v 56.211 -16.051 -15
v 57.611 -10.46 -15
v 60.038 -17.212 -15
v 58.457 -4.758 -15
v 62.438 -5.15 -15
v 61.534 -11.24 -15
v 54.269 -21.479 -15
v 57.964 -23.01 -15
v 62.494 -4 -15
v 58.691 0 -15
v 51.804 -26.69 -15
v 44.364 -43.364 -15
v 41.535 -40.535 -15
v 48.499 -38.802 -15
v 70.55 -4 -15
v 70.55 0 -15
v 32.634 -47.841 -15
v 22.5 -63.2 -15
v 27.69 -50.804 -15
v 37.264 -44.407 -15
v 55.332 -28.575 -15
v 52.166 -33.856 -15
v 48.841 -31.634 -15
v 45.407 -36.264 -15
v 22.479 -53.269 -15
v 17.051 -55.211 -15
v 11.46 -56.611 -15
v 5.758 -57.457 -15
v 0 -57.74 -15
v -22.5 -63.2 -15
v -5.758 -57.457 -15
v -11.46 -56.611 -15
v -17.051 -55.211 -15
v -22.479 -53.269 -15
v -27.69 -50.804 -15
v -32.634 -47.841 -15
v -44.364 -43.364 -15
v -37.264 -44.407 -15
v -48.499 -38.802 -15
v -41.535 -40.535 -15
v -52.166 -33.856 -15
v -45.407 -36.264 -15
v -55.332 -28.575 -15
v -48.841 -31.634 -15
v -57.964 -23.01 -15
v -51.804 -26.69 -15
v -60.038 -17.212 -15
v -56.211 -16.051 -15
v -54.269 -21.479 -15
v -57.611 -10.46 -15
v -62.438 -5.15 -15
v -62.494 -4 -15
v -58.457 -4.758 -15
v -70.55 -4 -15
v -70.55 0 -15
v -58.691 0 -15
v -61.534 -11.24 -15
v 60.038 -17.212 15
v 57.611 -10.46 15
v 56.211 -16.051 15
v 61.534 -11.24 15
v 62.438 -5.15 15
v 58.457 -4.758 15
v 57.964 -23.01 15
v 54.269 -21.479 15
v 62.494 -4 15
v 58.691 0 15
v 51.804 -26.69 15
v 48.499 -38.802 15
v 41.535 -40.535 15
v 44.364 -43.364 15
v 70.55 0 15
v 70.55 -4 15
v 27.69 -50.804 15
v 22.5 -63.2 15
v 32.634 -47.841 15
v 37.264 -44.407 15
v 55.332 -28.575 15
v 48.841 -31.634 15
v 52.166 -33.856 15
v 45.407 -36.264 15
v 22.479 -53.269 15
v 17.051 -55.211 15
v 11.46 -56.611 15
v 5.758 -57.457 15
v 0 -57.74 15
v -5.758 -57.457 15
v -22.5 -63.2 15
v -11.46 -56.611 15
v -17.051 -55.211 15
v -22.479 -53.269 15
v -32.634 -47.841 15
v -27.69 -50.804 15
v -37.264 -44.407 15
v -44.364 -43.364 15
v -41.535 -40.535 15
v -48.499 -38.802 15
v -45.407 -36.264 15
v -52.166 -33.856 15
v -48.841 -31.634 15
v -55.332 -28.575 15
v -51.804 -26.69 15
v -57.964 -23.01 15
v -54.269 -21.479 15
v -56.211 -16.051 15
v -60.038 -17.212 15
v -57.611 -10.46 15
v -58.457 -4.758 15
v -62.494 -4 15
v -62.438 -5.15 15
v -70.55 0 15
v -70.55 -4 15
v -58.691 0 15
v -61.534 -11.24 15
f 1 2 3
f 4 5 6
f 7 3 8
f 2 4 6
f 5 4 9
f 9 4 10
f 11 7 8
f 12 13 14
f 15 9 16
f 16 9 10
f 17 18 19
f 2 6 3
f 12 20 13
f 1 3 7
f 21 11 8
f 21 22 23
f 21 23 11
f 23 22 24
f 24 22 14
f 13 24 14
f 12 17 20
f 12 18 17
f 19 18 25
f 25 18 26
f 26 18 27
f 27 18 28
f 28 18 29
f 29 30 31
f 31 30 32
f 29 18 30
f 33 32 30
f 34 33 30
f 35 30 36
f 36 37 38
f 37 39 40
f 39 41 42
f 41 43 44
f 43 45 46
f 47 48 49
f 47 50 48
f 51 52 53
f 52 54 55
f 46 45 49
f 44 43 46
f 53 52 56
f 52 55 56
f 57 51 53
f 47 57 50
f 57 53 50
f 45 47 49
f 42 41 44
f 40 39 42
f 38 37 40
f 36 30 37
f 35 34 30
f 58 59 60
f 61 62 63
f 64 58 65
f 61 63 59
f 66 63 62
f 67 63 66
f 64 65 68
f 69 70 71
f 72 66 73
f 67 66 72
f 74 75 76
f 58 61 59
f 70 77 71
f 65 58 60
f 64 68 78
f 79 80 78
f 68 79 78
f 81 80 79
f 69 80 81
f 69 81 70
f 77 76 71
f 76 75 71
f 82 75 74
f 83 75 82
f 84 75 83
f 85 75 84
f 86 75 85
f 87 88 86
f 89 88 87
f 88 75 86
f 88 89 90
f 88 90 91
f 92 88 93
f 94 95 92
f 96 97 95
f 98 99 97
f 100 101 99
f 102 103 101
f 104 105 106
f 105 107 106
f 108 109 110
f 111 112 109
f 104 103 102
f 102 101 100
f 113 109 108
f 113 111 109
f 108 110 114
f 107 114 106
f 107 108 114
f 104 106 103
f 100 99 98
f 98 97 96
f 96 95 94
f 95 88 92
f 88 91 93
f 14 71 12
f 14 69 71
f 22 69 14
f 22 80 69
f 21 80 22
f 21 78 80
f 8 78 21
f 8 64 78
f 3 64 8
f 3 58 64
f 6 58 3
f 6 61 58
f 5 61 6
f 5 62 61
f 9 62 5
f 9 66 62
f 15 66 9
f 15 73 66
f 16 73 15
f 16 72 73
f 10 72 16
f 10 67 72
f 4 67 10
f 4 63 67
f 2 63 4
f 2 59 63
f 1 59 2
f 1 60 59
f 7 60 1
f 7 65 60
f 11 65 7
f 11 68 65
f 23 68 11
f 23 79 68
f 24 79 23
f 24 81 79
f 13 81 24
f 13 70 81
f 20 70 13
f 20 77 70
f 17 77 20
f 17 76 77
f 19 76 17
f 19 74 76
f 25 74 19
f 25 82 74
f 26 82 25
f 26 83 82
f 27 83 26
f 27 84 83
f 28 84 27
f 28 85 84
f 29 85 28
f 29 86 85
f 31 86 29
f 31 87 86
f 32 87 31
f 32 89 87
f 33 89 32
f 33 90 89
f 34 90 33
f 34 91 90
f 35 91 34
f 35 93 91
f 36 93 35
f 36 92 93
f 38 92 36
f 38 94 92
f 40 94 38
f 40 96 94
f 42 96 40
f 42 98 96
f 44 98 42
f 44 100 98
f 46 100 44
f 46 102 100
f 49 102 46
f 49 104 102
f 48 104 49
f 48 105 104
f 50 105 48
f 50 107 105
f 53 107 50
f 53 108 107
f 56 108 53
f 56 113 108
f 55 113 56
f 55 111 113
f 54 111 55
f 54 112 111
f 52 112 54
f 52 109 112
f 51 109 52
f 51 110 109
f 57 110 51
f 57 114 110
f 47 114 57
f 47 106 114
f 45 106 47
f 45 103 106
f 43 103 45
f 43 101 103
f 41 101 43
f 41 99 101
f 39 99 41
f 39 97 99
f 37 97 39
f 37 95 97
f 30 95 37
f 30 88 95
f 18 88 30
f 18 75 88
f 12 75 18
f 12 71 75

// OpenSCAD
// file: clamp.scad
// Flange Clamp for the Blue Robotics Watertight Enclosure
//
// This document is a parametric design that does not include dimensions.
// Please use one of the accompanying files, e.g., enclosure-clamp-3in.scad.
//
// Based on the WTE3-M-CLAMP-R1 model by Blue Robotics:
// https://bluerobotics.com/store/watertight-enclosures/enclosure-clamp/
//
// OpenSCAD model by Ryan Govostes.
// License: CC BY 4.0 (https://creativecommons.org/licenses/by/4.0/)


fillet_radius = 1.00;


// The circle is centered 1.00 mm above the X axis. This detail is not
// captured in the mechanical drawing but has been confirmed by Blue Robotics:
//
// https://discuss.bluerobotics.com/t/small-offset-in-mounting-clamp/15944/2
circle_y_offset = 1.00;


$fn = 64;


translate([0, 0, -(height/2)])
linear_extrude(height) {
    difference() {
        union() {
            hull() {
                translate([0, circle_y_offset])
                circle(r=(radius + thickness));

                translate([-(base_width/2), -depth])
                square(size=[base_width, 1]);
            }

            translate([-(width/2), -thickness])
            square([width, thickness]);
        }

        translate([0, circle_y_offset])
        circle(r=radius);

        // Cut off the top half of the shape
        translate([-200, 0])
        square([400, 400]);
    }
}

// TODO: Flange fillets
// TODO: Mounting and flange holes
// main file
// Flange Clamp for the Blue Robotics Watertight Enclosure, 4" (100mm) series
//
// Based on the WTE4-M-CLAMP-R1 model by Blue Robotics:
// https://bluerobotics.com/store/watertight-enclosures/enclosure-clamp/
//
// OpenSCAD model by Ryan Govostes.
// License: CC BY 4.0 (https://creativecommons.org/licenses/by/4.0/)


radius = 58.74;  // Tube OD - aluminum: 112.0 +/- 0.3mm, acrylic: 114.3 +/- 0.8mm
thickness = 4.00;

width = 141.10;
depth = 63.20;
height = 30.00;

base_width = 45.00;
base_hole_diameter = 3.30;  // M4x14
base_hole_depth = 5.50;

flange_hole_diameter = 2.50;  // M3x12


include <clamp.scad>;
